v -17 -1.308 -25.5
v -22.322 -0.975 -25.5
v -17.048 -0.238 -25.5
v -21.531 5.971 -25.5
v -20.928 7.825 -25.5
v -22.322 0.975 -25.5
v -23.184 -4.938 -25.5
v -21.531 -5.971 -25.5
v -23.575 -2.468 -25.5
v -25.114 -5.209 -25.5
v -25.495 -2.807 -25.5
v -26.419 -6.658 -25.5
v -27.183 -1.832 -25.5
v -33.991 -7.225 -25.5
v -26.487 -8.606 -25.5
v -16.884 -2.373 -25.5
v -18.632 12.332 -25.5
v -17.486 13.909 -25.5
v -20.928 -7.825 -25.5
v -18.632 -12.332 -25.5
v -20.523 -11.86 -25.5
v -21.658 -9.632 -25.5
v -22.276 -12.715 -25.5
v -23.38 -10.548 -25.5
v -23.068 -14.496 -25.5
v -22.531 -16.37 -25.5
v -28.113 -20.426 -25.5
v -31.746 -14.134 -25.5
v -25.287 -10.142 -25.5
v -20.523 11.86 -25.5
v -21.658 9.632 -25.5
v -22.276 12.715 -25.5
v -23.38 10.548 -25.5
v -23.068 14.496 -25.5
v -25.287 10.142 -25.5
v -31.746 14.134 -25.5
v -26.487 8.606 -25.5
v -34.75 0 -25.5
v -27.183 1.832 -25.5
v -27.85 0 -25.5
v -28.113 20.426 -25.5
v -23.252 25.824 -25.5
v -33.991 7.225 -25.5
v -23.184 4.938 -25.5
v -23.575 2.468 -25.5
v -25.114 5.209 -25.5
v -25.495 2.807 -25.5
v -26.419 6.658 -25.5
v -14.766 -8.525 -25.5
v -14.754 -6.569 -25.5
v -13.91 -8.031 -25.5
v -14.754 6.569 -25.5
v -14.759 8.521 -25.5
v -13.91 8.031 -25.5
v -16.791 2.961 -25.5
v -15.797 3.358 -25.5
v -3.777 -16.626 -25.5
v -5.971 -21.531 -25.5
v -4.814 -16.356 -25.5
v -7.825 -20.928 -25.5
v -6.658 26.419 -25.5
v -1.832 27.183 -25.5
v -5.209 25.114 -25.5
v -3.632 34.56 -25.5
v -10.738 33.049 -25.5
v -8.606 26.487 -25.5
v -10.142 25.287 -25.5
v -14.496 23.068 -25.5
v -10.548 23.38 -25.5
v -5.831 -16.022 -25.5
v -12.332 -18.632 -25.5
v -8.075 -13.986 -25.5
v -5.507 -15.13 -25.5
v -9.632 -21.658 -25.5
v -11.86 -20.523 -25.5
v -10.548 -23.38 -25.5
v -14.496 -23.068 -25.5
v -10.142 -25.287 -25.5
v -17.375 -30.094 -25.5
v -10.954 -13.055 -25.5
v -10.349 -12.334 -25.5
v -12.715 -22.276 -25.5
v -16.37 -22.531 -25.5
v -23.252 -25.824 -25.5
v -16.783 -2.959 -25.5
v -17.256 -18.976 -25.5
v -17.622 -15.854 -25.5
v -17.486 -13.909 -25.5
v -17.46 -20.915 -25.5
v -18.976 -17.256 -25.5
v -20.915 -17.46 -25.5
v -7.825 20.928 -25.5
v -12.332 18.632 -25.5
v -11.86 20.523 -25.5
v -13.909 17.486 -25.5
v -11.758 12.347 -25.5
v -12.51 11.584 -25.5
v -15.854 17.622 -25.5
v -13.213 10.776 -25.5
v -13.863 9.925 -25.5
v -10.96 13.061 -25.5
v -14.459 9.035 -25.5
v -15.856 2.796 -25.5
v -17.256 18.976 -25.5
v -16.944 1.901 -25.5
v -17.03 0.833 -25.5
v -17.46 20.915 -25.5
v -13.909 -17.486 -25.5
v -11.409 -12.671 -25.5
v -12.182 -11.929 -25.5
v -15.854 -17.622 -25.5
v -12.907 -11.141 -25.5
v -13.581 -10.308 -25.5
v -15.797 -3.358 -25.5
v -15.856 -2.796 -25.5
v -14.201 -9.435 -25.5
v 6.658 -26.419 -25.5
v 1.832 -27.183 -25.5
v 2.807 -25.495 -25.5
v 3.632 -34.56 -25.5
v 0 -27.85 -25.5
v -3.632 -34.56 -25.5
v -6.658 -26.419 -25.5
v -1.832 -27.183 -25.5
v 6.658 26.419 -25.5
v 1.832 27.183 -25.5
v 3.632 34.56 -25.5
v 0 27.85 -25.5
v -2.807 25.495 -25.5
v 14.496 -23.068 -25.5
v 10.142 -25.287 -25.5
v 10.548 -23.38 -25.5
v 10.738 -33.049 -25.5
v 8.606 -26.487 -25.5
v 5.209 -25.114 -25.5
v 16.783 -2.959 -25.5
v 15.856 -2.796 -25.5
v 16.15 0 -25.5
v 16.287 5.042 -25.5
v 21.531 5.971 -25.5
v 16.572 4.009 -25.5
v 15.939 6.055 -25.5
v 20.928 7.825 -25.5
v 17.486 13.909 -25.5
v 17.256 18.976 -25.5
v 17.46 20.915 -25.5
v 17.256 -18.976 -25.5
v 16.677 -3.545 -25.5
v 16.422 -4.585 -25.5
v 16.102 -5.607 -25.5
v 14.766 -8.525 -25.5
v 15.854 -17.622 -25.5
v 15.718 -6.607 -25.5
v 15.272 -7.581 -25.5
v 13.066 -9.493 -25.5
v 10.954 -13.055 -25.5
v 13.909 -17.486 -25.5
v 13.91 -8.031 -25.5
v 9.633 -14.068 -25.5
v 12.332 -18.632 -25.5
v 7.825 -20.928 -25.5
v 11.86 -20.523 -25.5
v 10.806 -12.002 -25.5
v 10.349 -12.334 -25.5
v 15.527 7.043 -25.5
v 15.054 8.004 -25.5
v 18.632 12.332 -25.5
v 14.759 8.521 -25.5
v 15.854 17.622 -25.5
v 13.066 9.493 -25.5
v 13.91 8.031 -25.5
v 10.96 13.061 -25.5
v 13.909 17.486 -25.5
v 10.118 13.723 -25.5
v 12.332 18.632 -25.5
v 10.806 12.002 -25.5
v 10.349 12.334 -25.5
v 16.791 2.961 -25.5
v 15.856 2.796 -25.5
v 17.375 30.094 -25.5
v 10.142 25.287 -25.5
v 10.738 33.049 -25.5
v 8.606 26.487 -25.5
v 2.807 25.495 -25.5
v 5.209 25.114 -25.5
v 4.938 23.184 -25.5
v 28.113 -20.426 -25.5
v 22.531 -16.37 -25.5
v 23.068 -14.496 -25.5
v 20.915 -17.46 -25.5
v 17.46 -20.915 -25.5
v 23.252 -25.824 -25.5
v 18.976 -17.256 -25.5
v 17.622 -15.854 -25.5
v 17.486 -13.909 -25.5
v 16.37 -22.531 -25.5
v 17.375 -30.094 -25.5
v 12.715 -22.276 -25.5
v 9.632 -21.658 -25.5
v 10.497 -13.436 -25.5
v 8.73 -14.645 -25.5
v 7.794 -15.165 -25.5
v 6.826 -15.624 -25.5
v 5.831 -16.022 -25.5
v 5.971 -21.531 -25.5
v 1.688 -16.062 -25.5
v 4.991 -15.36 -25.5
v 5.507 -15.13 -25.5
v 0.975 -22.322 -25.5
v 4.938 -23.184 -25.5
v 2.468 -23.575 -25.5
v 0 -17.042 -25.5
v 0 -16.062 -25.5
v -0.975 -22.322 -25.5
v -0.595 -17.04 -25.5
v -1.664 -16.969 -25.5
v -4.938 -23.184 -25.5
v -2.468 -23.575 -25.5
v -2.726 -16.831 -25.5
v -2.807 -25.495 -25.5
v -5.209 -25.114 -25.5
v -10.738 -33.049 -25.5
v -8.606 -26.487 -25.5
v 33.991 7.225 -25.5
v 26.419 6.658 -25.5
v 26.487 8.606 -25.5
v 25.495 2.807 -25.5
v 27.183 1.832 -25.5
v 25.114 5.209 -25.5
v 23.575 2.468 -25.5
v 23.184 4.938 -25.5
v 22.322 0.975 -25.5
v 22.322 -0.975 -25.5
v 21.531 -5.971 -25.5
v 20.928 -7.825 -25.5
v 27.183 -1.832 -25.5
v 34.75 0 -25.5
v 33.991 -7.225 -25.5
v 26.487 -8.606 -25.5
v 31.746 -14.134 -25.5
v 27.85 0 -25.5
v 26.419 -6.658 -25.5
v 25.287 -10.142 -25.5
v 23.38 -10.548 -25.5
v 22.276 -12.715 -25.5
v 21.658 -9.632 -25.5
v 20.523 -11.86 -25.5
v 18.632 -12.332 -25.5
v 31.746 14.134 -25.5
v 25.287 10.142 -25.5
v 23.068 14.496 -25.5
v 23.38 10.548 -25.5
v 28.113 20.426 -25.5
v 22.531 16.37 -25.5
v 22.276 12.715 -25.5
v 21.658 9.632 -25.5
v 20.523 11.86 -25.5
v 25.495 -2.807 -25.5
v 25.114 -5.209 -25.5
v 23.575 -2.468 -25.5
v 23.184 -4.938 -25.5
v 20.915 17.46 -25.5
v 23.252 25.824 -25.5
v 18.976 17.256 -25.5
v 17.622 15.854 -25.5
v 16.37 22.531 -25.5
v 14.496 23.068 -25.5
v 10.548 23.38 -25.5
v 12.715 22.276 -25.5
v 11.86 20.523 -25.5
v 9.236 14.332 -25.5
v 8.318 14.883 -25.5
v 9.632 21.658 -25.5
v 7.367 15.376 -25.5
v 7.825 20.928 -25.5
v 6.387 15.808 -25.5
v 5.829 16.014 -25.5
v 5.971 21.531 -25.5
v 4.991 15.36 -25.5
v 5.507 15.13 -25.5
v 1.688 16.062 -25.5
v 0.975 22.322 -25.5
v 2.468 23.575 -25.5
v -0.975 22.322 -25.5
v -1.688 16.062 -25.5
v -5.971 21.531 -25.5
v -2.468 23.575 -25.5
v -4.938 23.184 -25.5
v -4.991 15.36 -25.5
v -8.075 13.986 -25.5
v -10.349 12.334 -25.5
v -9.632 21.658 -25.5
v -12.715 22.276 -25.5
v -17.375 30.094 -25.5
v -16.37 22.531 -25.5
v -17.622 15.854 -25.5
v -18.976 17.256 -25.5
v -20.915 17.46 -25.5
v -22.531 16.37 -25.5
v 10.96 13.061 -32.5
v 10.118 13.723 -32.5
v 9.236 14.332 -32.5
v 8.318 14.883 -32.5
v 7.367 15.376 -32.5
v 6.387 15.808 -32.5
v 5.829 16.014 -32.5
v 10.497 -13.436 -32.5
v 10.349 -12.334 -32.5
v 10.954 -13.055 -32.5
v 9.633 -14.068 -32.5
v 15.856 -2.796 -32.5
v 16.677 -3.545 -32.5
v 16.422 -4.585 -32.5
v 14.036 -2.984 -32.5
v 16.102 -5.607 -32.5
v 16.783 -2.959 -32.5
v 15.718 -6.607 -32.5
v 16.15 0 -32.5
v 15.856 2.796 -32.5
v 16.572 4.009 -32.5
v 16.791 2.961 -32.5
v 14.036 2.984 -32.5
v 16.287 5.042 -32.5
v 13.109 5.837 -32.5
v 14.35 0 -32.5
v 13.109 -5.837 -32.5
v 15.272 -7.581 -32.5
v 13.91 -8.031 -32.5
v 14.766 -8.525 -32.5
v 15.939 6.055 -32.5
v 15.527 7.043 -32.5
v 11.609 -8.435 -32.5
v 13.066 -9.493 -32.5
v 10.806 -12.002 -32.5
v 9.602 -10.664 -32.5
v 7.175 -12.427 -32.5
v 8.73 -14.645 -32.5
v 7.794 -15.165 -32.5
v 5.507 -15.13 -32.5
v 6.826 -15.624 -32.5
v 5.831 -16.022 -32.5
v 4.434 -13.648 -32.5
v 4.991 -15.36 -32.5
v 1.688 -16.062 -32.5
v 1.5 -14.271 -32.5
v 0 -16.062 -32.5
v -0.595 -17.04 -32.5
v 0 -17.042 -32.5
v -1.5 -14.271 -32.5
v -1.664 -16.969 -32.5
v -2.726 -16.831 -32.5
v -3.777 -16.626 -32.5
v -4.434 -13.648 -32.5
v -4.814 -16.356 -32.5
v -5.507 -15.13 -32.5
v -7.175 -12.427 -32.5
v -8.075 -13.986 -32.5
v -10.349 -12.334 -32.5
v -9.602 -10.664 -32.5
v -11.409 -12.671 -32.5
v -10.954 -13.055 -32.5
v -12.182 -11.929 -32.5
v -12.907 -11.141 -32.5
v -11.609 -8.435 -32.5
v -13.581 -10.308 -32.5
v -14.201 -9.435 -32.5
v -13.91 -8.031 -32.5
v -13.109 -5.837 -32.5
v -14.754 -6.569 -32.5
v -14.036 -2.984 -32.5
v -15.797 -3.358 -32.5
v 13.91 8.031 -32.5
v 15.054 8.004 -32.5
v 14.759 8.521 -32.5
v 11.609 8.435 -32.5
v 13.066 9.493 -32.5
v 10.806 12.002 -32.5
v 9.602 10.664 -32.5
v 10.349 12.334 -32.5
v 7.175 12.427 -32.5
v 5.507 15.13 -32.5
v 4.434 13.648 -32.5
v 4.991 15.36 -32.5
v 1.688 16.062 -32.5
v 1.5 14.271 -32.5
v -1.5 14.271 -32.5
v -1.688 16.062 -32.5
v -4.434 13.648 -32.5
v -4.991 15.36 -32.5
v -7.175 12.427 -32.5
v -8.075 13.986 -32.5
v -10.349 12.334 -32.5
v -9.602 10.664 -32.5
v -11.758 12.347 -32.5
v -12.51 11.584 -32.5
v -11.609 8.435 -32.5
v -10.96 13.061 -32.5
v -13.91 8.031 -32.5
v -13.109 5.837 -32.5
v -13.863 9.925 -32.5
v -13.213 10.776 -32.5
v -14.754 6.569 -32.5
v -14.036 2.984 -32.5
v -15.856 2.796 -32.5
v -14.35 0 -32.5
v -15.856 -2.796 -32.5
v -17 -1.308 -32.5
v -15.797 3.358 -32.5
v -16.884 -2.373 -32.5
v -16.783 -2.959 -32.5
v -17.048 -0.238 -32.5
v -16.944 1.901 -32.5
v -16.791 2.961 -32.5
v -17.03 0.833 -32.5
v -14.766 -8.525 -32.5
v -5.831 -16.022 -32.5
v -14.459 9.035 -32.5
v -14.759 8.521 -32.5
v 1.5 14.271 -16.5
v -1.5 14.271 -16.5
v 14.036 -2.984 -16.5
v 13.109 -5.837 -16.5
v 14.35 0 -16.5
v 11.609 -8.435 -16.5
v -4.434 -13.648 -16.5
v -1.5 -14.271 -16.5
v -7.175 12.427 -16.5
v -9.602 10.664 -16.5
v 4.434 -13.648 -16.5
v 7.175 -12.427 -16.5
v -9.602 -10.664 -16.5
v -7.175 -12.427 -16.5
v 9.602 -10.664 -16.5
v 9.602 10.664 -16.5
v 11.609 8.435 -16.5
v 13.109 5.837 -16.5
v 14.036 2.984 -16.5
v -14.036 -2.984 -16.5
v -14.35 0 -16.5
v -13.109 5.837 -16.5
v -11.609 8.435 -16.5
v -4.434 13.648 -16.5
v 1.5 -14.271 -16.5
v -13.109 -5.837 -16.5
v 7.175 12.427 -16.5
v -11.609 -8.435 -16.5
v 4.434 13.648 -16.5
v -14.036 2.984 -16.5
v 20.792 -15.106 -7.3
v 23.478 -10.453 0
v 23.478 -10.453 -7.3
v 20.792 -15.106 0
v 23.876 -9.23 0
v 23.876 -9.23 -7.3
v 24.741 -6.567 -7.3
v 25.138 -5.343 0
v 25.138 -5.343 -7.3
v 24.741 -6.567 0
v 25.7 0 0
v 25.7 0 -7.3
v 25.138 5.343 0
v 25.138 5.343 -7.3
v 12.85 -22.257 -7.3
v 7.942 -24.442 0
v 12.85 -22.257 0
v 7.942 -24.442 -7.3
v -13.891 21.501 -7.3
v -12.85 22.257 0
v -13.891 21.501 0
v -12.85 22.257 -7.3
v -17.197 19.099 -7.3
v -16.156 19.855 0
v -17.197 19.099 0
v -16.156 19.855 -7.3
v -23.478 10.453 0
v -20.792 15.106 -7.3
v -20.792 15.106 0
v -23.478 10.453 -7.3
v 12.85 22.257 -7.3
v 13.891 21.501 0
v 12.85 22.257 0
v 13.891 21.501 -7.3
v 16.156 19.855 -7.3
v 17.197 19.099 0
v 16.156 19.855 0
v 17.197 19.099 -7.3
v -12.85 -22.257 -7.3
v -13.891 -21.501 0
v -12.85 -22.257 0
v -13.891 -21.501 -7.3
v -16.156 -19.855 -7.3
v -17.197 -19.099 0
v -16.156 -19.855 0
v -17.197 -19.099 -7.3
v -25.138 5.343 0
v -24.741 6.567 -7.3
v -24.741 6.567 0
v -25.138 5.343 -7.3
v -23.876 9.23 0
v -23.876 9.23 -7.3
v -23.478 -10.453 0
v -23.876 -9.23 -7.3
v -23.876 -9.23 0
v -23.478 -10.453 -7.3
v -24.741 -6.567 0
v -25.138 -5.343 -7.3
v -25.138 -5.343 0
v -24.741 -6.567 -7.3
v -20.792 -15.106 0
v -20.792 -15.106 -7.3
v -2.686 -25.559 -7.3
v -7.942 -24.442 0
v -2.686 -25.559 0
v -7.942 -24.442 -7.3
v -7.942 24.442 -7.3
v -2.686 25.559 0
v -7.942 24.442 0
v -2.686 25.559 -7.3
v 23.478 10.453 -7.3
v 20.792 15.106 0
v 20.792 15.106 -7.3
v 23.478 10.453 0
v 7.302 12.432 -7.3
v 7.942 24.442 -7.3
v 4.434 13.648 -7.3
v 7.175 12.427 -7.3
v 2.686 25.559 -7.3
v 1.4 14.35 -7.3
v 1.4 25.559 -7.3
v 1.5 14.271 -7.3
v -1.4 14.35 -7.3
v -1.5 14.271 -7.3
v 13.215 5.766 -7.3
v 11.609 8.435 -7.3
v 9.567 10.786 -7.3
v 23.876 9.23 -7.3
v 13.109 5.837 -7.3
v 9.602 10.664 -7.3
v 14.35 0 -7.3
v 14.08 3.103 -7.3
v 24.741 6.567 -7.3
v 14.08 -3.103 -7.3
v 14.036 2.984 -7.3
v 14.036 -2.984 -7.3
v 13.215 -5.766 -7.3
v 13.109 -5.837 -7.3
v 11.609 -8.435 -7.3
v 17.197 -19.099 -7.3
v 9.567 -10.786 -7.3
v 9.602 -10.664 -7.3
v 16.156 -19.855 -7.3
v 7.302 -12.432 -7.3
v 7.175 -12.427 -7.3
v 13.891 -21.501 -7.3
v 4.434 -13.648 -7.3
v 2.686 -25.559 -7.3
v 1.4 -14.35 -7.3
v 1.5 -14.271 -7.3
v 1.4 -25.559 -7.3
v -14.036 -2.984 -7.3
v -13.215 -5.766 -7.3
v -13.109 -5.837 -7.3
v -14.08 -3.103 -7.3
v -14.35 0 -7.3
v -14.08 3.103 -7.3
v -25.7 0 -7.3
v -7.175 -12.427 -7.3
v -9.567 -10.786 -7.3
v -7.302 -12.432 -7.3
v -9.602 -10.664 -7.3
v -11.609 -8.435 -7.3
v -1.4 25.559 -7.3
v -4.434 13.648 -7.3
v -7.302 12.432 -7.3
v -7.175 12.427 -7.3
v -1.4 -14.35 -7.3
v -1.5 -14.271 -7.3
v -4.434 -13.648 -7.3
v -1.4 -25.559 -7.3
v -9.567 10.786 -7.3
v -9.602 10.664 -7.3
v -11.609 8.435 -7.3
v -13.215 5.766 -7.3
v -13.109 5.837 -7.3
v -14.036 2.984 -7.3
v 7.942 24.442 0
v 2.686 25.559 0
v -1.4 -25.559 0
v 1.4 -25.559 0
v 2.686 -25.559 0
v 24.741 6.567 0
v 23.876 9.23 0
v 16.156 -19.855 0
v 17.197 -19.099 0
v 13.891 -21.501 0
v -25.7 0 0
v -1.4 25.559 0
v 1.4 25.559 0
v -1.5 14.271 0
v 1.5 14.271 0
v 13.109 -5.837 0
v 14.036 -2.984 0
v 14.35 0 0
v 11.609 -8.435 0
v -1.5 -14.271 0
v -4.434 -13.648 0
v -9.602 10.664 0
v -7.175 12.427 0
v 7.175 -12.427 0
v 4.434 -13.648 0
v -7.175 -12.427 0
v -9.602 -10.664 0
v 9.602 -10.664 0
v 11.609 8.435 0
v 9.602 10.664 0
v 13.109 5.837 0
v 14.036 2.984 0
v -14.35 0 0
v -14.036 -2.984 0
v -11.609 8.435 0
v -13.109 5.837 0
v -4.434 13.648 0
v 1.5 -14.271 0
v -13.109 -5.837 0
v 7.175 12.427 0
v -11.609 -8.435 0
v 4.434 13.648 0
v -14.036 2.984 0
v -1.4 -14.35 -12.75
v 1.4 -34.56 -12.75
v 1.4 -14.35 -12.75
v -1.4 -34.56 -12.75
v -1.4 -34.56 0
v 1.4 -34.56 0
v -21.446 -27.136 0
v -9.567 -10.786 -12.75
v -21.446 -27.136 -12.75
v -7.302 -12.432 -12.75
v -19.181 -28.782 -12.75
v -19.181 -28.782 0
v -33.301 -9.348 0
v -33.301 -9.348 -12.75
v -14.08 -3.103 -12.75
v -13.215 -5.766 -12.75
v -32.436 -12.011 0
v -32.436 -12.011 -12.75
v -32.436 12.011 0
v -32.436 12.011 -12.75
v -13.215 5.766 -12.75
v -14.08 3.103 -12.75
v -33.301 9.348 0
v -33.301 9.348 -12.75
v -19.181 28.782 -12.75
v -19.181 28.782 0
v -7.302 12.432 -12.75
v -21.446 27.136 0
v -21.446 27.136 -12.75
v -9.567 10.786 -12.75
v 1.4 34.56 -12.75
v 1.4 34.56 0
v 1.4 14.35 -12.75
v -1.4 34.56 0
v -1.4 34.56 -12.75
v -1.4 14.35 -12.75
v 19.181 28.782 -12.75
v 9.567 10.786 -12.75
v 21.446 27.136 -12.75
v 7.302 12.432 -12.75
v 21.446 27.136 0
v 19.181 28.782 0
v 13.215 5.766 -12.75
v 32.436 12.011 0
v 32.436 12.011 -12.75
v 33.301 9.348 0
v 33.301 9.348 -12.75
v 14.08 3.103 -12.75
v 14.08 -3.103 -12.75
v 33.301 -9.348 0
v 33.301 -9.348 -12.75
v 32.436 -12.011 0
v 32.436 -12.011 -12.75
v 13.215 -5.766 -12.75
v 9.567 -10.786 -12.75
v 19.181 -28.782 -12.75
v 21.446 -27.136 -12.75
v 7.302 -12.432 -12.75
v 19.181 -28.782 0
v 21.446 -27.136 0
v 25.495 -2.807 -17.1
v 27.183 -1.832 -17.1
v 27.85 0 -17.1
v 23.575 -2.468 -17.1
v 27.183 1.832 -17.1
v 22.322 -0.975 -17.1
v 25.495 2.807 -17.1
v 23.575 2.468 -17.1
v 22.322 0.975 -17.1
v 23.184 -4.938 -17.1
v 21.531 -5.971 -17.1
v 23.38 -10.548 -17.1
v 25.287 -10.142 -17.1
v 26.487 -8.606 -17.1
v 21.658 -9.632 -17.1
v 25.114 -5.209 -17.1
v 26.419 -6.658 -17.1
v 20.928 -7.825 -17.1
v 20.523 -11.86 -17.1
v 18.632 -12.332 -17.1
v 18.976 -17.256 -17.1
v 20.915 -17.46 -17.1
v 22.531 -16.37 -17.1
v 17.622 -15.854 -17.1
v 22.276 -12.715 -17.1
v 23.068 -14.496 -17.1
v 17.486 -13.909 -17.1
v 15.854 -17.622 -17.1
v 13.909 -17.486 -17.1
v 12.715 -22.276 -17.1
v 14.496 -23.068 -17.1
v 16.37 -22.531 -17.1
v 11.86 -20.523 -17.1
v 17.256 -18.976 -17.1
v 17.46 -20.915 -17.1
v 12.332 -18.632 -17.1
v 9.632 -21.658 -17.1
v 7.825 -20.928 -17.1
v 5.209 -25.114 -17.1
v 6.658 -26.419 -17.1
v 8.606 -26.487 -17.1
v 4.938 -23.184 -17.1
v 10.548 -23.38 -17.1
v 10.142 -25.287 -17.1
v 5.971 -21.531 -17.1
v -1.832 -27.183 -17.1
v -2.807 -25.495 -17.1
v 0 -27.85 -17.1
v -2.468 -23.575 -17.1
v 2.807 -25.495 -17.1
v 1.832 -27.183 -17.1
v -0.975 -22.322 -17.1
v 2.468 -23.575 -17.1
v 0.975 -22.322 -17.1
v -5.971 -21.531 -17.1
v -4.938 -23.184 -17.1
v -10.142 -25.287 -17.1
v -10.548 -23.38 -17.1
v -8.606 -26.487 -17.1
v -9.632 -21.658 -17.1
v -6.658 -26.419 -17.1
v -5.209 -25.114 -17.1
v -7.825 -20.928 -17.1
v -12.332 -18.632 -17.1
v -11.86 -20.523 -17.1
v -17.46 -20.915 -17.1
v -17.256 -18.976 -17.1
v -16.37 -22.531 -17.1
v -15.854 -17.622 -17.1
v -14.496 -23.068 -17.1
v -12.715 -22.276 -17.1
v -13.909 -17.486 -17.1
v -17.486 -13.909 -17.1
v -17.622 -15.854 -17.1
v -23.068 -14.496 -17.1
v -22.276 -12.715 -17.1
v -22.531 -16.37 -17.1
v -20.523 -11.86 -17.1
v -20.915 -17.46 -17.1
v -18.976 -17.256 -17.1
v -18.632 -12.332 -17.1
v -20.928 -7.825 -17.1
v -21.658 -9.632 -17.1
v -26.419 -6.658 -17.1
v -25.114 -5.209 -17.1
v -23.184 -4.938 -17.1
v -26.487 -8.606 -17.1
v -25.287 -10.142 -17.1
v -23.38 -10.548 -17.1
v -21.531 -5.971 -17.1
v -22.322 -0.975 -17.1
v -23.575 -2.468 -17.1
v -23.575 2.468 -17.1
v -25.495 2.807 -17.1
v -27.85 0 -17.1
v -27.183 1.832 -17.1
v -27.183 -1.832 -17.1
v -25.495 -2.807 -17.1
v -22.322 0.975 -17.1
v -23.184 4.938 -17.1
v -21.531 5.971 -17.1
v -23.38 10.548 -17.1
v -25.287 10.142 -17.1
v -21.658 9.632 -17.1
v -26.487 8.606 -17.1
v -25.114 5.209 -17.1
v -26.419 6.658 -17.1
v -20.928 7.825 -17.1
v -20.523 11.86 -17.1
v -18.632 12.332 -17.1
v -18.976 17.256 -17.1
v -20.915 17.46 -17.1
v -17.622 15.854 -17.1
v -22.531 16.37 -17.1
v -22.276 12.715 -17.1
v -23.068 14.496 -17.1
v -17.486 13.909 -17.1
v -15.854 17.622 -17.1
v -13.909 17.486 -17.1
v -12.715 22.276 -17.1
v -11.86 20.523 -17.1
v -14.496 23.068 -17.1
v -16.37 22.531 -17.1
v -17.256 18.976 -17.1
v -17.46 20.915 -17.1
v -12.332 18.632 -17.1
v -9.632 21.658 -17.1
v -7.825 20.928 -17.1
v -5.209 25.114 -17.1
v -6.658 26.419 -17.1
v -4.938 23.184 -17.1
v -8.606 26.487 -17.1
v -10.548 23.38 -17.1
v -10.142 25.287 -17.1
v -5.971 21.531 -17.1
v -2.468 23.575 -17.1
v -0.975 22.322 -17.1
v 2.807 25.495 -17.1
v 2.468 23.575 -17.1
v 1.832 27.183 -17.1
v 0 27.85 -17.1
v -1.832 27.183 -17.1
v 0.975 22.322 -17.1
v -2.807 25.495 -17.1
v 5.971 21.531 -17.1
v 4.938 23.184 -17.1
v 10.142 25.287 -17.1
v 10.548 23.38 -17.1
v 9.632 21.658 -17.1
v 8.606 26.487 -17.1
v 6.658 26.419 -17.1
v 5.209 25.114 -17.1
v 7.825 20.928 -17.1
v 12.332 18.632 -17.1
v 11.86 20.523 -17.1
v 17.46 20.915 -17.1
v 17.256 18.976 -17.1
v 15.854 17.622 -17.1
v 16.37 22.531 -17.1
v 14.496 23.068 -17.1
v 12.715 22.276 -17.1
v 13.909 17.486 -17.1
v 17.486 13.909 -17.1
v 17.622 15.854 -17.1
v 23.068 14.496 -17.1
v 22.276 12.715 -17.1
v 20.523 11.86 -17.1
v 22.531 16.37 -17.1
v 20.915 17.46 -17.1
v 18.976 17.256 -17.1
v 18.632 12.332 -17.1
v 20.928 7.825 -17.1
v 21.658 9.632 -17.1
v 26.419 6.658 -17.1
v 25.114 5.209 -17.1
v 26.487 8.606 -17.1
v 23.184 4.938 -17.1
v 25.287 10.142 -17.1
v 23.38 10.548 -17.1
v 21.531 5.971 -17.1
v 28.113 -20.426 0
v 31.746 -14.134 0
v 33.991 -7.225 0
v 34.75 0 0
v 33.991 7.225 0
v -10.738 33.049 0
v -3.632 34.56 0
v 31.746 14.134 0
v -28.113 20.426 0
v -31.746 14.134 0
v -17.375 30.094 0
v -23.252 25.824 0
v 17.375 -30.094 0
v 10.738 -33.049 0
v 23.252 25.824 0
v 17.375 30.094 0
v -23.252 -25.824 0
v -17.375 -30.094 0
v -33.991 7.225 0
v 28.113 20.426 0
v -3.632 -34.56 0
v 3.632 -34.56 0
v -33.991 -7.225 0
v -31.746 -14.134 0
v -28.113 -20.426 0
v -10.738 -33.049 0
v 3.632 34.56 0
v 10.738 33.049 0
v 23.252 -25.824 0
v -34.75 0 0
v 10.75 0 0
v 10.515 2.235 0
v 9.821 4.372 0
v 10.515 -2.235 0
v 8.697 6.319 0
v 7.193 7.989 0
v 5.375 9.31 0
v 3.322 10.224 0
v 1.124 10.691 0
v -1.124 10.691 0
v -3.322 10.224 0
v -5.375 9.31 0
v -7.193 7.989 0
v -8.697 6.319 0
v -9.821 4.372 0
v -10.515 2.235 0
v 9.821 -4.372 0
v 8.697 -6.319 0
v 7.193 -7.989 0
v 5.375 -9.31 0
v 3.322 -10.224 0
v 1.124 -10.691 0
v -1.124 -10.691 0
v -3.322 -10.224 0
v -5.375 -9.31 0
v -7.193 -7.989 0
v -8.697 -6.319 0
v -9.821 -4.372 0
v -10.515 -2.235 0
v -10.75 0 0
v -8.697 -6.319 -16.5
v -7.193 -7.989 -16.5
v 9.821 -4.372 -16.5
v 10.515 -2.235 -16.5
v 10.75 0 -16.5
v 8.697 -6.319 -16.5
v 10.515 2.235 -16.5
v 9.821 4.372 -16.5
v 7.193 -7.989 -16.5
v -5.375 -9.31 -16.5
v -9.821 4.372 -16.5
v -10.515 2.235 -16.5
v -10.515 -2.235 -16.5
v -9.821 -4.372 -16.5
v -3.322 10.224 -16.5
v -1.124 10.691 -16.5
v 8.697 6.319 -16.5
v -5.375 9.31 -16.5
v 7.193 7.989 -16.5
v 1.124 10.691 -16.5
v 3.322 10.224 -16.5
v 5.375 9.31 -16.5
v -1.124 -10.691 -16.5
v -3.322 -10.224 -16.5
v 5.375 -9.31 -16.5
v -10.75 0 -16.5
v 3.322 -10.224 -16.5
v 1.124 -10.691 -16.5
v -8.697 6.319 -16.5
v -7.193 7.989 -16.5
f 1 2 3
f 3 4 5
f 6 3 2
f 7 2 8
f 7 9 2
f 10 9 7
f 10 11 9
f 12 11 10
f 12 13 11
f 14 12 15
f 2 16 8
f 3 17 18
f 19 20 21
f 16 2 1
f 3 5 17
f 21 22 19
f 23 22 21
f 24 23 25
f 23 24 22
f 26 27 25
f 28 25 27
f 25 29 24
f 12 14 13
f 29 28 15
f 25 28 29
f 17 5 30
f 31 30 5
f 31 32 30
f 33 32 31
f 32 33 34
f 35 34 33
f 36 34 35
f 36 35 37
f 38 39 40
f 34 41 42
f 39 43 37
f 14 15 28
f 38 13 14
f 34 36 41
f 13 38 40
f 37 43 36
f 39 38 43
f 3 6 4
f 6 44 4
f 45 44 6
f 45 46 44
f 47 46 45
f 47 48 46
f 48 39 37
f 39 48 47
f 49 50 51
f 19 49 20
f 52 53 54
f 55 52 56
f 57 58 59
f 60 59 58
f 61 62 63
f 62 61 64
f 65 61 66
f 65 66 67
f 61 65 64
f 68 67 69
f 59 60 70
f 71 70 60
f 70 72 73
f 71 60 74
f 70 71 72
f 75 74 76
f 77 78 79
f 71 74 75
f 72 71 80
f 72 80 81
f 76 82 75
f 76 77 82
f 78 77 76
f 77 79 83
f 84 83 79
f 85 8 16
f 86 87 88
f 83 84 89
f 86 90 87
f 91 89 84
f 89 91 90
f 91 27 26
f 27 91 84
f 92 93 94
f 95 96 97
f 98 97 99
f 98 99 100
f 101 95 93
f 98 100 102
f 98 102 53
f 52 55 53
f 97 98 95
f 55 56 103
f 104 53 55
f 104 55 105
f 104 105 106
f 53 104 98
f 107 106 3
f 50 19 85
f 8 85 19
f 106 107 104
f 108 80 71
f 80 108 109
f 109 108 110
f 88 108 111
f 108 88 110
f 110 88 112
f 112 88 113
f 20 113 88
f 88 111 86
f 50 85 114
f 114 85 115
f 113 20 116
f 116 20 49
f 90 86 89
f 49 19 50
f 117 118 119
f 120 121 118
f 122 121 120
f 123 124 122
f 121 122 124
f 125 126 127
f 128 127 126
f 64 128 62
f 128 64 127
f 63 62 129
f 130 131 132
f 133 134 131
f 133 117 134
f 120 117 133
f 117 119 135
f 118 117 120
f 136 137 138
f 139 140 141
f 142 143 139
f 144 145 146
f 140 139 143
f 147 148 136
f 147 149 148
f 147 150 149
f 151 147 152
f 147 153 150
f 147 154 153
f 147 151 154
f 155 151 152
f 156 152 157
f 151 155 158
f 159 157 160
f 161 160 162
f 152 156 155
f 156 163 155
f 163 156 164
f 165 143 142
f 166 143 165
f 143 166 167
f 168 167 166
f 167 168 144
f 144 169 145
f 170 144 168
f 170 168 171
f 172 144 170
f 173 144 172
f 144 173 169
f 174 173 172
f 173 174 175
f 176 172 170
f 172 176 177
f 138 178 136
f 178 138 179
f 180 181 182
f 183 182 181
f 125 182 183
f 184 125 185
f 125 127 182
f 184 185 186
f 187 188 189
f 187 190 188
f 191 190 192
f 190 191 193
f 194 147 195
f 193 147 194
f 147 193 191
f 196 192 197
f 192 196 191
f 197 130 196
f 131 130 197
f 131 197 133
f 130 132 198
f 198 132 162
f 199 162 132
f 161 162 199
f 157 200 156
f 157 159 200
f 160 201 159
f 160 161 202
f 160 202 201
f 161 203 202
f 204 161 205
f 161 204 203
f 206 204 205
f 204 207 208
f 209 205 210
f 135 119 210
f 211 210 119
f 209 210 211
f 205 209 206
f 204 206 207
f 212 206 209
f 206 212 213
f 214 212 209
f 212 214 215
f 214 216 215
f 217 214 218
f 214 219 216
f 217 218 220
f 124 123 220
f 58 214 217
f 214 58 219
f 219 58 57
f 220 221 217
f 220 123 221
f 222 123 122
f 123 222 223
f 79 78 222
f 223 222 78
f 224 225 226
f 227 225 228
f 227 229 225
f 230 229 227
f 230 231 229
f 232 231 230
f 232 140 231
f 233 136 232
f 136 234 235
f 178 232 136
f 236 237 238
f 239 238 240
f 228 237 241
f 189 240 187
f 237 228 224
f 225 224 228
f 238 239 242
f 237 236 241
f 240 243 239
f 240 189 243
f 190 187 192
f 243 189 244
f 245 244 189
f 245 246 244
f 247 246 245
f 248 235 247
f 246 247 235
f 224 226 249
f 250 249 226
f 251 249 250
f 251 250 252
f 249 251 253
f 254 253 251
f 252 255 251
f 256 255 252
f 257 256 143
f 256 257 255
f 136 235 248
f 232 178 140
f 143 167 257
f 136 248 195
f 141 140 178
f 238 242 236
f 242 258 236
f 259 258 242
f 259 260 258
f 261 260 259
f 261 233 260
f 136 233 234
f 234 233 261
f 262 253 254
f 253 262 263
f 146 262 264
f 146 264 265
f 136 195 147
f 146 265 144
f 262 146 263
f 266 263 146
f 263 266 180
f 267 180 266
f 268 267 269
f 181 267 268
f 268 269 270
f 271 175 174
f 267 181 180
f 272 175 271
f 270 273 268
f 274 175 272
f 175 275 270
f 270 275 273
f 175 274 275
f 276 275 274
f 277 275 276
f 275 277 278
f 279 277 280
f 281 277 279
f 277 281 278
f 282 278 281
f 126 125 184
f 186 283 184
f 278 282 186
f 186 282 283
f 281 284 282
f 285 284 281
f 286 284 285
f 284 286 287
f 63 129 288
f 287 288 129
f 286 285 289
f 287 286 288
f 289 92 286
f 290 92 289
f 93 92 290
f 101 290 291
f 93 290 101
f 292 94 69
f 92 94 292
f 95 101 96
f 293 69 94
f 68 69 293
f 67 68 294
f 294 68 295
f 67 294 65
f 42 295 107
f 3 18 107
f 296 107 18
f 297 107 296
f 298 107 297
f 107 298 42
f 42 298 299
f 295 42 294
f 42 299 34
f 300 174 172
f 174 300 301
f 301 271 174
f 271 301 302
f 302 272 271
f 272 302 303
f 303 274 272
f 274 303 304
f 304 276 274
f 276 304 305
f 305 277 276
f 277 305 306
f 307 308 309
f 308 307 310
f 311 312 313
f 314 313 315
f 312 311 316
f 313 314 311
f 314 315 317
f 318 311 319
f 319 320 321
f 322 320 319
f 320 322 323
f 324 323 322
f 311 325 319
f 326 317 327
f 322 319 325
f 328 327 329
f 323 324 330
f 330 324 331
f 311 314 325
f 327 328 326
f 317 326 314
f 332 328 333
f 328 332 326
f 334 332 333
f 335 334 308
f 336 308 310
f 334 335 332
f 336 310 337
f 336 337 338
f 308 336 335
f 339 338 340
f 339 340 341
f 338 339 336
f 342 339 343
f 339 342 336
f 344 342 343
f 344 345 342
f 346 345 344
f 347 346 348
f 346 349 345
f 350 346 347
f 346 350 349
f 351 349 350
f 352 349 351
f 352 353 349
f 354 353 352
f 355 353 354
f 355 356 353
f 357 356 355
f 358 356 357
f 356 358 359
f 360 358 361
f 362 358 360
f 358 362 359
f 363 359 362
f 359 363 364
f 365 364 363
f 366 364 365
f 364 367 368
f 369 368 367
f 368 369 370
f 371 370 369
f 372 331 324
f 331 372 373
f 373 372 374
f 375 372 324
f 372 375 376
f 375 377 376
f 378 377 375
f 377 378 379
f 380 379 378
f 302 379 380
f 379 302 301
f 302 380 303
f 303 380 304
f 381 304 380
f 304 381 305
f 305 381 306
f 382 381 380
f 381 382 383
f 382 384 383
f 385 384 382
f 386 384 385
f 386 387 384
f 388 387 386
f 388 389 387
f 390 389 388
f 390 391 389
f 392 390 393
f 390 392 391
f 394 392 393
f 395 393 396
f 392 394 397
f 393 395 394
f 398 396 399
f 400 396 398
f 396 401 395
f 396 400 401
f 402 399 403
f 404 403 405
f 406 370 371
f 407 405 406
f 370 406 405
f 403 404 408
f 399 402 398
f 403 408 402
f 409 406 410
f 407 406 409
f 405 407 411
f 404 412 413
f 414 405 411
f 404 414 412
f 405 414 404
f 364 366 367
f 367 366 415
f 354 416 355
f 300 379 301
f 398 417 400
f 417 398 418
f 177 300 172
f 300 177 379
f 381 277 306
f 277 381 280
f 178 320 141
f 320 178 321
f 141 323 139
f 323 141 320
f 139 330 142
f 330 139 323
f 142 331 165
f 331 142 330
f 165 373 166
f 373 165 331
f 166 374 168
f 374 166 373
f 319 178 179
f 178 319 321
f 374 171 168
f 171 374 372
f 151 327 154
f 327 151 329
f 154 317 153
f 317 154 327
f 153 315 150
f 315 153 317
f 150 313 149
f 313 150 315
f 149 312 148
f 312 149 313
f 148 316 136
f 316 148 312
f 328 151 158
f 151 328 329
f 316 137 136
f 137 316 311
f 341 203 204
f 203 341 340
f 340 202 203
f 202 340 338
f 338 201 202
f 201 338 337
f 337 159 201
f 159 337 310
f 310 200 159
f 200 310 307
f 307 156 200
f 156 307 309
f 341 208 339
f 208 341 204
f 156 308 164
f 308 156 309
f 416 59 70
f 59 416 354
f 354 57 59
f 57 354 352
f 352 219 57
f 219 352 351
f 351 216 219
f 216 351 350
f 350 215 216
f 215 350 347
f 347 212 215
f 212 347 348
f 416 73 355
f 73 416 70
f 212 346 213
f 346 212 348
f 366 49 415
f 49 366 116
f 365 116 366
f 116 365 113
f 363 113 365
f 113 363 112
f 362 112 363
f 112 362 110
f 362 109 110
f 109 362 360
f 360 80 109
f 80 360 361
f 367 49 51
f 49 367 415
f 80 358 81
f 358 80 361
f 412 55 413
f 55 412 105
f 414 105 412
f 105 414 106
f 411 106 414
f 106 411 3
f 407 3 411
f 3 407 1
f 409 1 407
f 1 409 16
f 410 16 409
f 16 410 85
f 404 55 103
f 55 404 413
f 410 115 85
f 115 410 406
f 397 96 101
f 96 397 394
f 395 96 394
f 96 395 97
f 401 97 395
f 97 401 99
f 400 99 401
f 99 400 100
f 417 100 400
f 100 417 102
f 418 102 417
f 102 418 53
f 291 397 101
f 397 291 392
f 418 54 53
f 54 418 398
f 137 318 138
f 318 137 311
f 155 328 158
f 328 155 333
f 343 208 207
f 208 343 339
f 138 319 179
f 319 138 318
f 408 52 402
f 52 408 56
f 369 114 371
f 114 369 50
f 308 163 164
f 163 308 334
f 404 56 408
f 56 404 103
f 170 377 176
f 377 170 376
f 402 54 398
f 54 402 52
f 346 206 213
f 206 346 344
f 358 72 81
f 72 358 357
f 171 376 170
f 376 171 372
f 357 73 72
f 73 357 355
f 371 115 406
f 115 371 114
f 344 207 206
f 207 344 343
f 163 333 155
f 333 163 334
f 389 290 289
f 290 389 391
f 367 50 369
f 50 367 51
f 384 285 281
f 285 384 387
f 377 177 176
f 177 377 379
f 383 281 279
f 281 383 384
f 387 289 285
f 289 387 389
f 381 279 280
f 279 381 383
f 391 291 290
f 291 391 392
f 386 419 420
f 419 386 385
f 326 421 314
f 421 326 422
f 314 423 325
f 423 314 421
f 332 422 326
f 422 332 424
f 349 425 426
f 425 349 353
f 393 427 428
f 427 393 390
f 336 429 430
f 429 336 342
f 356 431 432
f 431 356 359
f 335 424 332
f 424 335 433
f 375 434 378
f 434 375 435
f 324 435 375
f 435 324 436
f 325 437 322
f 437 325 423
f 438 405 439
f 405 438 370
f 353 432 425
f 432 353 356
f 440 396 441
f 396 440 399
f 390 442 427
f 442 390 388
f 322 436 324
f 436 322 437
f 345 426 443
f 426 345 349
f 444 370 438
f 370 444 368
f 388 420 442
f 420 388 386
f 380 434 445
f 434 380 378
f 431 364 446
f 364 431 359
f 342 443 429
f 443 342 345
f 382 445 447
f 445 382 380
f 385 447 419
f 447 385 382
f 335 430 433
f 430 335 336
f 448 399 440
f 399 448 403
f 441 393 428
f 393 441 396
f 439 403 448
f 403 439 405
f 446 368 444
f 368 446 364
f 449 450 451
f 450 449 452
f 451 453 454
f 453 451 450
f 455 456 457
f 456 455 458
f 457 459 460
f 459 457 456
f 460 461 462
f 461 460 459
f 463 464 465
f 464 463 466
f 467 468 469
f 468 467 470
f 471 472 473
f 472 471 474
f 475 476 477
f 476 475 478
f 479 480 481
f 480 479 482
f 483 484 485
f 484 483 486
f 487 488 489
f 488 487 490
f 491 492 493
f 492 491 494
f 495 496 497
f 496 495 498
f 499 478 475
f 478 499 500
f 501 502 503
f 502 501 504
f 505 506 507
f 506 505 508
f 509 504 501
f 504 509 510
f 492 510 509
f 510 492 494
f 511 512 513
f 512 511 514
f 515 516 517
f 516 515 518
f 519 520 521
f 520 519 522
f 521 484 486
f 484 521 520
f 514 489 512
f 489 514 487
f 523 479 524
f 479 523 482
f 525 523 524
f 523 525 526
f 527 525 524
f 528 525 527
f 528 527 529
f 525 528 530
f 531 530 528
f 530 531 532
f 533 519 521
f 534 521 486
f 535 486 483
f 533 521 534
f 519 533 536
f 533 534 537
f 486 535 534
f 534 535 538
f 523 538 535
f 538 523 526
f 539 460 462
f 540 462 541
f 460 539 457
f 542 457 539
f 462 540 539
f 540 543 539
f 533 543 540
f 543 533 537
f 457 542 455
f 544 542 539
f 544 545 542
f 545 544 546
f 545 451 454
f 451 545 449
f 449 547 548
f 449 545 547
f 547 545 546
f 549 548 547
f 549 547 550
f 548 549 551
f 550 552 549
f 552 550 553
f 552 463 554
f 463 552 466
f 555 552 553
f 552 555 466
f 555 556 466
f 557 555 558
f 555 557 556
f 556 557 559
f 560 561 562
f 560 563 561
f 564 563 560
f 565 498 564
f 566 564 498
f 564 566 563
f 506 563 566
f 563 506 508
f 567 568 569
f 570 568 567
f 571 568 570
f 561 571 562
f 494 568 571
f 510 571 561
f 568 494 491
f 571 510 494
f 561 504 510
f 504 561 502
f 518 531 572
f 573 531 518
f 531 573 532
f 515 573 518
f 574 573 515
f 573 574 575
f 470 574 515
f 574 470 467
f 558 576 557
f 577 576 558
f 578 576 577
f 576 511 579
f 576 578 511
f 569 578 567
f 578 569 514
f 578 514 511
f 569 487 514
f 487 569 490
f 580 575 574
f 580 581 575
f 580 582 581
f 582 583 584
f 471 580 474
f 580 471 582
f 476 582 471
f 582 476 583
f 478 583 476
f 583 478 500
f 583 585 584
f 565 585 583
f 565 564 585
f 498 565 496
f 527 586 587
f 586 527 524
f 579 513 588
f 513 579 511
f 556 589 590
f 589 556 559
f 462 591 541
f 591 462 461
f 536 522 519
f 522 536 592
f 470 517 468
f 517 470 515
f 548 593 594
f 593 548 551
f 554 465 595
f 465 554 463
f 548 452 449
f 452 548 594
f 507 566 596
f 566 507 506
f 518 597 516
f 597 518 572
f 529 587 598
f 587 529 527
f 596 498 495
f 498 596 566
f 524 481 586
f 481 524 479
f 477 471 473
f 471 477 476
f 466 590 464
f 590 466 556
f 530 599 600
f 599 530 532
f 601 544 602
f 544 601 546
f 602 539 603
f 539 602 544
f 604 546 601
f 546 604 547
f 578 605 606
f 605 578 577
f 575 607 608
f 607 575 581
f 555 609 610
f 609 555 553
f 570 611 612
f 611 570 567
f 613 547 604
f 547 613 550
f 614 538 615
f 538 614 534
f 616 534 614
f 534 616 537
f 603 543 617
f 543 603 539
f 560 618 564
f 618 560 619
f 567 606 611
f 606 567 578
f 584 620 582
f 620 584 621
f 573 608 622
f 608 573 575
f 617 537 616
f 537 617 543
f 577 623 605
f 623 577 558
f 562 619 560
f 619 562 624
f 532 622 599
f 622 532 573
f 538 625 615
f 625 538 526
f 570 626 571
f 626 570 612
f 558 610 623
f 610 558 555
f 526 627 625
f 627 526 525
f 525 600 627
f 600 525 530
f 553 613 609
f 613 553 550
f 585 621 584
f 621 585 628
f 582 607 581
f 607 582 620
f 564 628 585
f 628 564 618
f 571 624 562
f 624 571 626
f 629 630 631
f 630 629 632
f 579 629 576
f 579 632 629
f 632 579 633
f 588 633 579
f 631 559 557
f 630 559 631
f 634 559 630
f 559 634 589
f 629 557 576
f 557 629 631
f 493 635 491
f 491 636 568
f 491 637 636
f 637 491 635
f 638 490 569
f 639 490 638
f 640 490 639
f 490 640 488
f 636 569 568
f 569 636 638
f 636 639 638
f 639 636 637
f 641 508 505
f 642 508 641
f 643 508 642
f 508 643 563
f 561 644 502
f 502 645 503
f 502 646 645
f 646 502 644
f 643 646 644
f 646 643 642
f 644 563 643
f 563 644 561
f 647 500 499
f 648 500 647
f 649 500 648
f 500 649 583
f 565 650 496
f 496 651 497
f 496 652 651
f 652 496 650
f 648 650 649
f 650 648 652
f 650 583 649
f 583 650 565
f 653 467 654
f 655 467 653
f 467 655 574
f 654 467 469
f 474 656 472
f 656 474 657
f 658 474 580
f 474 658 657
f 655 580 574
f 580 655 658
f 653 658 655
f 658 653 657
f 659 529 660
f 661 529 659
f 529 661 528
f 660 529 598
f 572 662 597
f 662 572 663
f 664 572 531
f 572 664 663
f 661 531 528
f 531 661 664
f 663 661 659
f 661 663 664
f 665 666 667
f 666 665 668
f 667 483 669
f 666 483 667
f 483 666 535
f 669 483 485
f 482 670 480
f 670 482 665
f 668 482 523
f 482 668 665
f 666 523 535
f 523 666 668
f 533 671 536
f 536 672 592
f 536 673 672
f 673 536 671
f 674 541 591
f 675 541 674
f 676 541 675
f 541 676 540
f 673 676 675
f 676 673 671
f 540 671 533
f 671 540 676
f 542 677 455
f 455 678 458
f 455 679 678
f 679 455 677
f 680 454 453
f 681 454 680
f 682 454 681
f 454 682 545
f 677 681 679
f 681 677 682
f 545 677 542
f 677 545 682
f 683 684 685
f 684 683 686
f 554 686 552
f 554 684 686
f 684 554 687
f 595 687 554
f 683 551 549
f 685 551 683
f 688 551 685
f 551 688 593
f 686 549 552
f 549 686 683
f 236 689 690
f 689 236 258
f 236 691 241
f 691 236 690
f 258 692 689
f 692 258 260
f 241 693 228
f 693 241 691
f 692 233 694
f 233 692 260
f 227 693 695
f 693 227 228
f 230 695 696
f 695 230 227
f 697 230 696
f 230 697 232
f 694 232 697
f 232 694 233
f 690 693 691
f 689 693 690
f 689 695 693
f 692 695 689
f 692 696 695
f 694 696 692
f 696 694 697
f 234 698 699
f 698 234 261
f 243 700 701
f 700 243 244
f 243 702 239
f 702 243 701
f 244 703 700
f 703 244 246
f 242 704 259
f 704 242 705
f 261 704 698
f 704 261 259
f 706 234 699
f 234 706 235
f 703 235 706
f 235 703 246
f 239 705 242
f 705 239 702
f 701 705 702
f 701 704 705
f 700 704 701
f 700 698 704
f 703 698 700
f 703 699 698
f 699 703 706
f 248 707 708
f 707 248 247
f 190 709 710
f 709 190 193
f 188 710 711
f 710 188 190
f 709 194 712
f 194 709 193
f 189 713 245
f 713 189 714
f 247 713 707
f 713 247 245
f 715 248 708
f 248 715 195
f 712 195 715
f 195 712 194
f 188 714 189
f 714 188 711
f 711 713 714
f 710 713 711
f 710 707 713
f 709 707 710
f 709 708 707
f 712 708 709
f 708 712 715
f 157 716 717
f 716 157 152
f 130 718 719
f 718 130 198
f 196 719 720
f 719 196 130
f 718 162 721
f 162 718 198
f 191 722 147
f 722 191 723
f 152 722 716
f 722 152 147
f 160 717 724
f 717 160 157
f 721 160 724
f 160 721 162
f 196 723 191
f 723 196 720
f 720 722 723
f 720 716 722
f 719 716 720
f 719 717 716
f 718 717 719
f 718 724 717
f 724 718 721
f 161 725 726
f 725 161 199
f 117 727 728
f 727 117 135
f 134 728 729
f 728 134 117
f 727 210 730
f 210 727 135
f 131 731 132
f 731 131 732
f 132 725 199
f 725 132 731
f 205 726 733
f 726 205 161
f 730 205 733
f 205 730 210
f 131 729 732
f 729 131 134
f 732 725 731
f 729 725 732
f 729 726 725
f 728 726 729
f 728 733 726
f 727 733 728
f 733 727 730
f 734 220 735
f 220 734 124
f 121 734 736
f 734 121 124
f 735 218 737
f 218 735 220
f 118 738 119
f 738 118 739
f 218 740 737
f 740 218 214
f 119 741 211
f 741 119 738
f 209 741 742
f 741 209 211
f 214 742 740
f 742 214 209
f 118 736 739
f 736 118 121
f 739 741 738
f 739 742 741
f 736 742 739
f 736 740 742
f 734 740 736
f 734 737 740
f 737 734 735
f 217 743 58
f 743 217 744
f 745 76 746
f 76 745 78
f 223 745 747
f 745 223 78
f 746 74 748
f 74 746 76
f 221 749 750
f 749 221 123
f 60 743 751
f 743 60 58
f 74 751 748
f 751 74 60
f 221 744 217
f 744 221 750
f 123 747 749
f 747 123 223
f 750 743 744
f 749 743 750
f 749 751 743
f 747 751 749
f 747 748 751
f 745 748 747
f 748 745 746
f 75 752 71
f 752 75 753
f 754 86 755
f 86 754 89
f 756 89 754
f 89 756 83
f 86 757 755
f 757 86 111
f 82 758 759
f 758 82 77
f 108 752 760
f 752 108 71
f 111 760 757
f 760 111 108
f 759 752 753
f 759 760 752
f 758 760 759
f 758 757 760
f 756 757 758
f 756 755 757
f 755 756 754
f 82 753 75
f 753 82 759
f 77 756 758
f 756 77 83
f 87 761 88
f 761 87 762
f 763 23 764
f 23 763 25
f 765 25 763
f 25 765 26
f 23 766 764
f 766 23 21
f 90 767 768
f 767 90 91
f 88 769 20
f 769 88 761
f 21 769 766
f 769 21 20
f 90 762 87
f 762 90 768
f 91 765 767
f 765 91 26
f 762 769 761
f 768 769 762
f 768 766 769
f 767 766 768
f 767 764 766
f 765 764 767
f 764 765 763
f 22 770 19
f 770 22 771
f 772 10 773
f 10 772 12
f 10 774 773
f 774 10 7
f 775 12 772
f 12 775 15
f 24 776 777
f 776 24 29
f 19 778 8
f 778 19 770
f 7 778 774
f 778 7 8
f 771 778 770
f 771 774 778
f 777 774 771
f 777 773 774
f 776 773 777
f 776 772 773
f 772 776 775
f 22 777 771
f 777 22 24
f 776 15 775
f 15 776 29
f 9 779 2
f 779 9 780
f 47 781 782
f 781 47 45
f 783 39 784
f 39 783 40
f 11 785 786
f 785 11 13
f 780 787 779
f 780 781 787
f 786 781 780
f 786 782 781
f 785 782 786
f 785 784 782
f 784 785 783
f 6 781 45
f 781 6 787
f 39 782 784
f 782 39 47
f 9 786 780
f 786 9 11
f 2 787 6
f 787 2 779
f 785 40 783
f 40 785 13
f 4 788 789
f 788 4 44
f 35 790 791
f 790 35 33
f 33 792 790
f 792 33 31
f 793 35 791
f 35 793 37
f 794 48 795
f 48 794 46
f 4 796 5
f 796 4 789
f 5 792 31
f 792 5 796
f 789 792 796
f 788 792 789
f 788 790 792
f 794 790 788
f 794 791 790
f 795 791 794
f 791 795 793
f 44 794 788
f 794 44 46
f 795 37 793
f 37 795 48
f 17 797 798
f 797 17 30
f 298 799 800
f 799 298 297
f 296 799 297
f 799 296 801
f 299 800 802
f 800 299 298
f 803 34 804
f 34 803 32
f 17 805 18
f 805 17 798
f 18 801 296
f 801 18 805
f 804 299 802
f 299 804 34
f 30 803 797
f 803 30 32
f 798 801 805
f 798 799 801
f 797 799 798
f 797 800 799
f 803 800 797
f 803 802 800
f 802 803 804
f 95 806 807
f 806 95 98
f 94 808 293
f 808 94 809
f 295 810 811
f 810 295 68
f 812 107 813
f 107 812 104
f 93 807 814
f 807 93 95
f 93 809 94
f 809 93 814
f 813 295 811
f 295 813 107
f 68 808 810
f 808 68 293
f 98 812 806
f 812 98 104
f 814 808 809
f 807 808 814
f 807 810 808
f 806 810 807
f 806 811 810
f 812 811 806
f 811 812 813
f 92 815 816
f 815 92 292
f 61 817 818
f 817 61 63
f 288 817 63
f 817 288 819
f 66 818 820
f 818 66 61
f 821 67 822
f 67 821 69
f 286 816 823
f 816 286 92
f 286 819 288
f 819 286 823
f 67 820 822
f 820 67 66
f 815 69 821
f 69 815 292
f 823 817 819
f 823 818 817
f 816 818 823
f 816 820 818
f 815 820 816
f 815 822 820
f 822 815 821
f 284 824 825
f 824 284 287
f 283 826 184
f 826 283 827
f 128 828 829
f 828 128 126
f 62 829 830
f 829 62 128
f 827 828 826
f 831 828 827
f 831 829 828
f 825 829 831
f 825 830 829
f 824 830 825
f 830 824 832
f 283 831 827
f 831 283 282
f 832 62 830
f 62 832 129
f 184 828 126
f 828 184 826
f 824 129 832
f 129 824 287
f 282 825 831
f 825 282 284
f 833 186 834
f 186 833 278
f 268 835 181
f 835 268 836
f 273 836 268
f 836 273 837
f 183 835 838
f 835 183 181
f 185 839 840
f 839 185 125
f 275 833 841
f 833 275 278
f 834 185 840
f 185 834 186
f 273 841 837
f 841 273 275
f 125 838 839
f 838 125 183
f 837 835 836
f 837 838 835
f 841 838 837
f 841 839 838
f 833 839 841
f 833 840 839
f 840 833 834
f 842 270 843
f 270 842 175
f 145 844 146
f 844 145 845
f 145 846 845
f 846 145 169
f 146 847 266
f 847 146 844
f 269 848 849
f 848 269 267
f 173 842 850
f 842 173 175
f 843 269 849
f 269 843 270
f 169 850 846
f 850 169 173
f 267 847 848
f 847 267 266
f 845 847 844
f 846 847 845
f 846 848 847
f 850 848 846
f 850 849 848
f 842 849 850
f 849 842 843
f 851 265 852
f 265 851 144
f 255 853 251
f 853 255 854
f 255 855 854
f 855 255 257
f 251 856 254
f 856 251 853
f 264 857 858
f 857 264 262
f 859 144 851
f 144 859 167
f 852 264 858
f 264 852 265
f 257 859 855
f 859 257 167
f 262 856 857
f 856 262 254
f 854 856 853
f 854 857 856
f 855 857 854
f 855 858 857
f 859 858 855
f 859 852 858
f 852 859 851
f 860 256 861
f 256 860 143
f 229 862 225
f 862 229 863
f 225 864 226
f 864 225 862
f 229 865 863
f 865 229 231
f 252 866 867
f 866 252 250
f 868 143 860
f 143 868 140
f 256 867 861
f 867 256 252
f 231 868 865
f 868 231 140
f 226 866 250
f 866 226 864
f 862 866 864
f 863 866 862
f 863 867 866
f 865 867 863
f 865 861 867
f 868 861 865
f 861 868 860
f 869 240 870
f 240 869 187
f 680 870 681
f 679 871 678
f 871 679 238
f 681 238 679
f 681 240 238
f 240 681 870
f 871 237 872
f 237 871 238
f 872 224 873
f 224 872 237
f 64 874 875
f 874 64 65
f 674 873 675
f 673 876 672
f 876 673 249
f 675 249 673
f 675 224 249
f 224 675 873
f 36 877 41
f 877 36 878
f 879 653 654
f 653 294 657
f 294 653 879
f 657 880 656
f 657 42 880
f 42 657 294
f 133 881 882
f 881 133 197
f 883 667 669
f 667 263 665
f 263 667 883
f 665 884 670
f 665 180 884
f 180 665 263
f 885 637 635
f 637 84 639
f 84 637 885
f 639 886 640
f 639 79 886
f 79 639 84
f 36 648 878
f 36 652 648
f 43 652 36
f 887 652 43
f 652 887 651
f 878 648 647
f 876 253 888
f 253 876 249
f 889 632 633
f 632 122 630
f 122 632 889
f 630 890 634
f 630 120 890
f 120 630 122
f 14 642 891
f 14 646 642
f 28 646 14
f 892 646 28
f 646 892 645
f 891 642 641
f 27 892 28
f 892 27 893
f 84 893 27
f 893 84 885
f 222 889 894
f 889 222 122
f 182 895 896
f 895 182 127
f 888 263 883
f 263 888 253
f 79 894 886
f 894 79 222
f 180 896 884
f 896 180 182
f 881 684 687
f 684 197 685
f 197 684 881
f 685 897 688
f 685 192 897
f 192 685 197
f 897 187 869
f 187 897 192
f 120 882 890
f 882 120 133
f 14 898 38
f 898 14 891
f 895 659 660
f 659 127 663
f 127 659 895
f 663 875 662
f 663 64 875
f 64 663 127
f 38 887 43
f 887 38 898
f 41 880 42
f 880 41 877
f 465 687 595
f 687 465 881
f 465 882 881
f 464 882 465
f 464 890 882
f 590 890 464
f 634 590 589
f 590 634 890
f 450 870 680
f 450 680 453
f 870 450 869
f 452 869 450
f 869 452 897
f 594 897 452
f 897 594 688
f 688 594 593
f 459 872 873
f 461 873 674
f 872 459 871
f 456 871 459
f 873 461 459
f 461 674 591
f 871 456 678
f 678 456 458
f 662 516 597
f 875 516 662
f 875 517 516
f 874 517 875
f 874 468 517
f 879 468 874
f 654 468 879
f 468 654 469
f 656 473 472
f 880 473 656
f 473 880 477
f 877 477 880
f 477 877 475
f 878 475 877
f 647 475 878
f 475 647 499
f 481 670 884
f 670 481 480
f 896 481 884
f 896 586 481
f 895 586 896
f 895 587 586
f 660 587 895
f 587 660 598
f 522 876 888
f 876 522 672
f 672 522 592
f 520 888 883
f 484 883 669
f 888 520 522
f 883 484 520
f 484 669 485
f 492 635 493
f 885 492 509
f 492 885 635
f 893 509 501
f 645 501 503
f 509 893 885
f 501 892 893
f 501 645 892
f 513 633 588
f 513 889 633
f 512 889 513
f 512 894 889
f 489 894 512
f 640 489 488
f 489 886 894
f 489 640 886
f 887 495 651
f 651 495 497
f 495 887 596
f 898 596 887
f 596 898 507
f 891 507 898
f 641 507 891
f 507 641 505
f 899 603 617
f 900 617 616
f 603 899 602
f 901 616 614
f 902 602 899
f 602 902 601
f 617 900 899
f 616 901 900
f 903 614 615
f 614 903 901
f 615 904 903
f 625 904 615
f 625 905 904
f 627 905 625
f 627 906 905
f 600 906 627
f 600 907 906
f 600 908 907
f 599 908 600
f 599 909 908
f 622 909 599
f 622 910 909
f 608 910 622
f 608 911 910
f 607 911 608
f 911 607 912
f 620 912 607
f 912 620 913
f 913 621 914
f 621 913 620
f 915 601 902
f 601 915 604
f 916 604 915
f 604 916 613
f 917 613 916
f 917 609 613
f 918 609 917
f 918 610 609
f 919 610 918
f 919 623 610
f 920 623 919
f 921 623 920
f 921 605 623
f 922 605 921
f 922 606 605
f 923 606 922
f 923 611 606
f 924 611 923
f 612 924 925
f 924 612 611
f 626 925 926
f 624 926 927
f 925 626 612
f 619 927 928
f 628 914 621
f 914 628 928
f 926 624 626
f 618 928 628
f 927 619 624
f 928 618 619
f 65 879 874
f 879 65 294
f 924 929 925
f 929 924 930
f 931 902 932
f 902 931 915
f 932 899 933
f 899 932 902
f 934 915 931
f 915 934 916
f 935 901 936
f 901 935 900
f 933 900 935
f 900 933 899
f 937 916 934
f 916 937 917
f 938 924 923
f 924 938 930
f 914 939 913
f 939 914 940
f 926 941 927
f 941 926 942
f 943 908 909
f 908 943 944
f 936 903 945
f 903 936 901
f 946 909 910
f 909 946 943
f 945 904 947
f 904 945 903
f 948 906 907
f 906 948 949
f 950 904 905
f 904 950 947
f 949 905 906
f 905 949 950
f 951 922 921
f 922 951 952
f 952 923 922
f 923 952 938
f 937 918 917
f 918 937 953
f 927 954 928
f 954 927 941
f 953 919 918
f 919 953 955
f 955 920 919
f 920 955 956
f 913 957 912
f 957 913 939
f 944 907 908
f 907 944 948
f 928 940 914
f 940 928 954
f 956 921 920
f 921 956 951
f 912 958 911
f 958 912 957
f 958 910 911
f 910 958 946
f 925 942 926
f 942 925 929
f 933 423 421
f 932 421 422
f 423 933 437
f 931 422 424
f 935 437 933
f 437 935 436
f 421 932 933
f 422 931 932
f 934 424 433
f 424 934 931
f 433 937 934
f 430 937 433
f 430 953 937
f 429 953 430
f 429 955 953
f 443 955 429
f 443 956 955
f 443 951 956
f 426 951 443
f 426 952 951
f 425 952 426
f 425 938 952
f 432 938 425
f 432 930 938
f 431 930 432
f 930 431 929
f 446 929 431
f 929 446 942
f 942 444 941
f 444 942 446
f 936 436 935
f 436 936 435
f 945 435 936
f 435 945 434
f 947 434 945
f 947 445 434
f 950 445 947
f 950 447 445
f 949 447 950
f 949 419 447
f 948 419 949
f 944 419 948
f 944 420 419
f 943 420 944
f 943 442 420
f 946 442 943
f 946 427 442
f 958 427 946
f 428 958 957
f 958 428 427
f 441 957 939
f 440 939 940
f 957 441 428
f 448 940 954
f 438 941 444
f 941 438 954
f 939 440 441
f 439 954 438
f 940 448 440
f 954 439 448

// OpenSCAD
// Cross Country Wheelchair Hub, with spigott for chain drive sprocket.
//
// Notes:
// z=0 is non-drive end (wheel spoke slots)
//
// Graham Jones, April 2013

h_h = 25.5; // Hub height in mm.
h_od = 69.5; // Hub outer diameter in mm.
h_id = 21.5; // Hub inner diameter (axle hole) in mm.

b_od = 28.7;  // outer diameter of wheel bearing in mm.
b_th = 9.0;   // thickness of wheel bearing in mm.

r_id = 28.7;     // wheel hub rebate inner diameter in mm;
r_od = 51.4;		// wheel hub rebate outer diameter in mm
r_th = 7.3;     // wheel hub rebate thickness (depth) in mm.

nSpokes = 10;  // Number of spokes in wheel.
s_od = 2.8;    // diameter of spokes (or really width of slots) in mm.
s_len = 50;    // length of spokes in mm.

nBrakeHoles = 20;  // Number of holes for the handbrake
bh_od = 5.7;   // diameter of brake holes in mm.
bh_h  = 8.4;   // depth of brake holes in mm.
bh_pcd = 50.0; // Pitch circle diameter of brake holes in mm.

g_h = 7;      // height of spiggot
g_od= 32.3;	  // diameter of the main spiggot.
g_d = 1;       // depth of spiggott splines in mm.
nSplines = 9;  // number of splines on the spiggott.

tol = 0.1;   // tolerance in mm.

rotate(180,[1,0,0]) {
	union() {
		spiggot();
		hub();
	}
}

module spiggot() {
		// spiggott
		translate([0,0,h_h])
			union() {
				for (sn = [1:nSplines-1]) {
					assign(ang = 2*sn*360/(2*nSplines)) {
						rotate(ang,[0,0,1])
							color("red") 
								arc( g_d+tol, g_h, g_d+g_od/2-tol, 360/(2*nSplines) );
					}
				}
				color("green")
					difference() { 
						cylinder(r=g_od/2,h=g_h);
						translate([0,0,-1*tol])
							cylinder(r=b_od/2,h=g_h+2*tol);
					}
			}
}

module hub() {
difference() {
	union() {
		// main cylinder
		cylinder(r=h_od/2,h=h_h);
	}
	// axle hole
	translate([0,0,-1*tol])
		cylinder(r=h_id/2, h=h_h+2*tol);
	// Bearing hole
	translate([0,0,h_h-b_th])
		color("red") cylinder(r=b_od/2,h=b_th+g_h+tol);
	// Wheel hub rebate
	translate([0,0,-1*tol]) difference() {
		color("blue") cylinder(r=r_od/2,h=r_th+tol);
		translate([0,0,-1*tol]) color("blue") cylinder(r=r_id/2,h=r_th+2*tol);
	}

	// Slots for wheel spokes
	for (sn = [0:nSpokes-1]) {
		assign(ang = sn*360/nSpokes) {
			rotate(ang,[0,0,1])
				translate([s_od/2,r_id/2,-1*tol])
					rotate(270,[0,1,0])
						cube([h_h/2+tol,s_len,s_od]);
						//cylinder(r=s_od/2,h=s_len);
		}
	}
	for (bh = [0:nBrakeHoles-1]) {
		assign(ang = bh*360/nBrakeHoles) {
			rotate(ang,[0,0,1])
				translate([bh_pcd/2,0,h_h-bh_h])
					color("blue") cylinder(r=bh_od/2,h=bh_h+tol);
		}
	}

}
}


/* 
 * Excerpt from... 
 * 
 * Parametric Encoder Wheel 
 *
 * by Alex Franke (codecreations), March 2012
 * http://www.theFrankes.com
 * 
 * Licenced under Creative Commons Attribution - Non-Commercial - Share Alike 3.0 
*/
 
module arc( height, depth, radius, degrees ) {
    // This dies a horible death if it's not rendered here 
    // -- sucks up all memory and spins out of control 
    render() {
        difference() {
            // Outer ring
            rotate_extrude($fn = 100)
                translate([radius - height, 0, 0])
                    square([height,depth]);
         
            // Cut half off
            translate([0,-(radius+1),-.5]) 
                cube ([radius+1,(radius+1)*2,depth+1]);
         
            // Cover the other half as necessary
            rotate([0,0,180-degrees])
            translate([0,-(radius+1),-.5]) 
                cube ([radius+1,(radius+1)*2,depth+1]);
         
        }
    }
}
